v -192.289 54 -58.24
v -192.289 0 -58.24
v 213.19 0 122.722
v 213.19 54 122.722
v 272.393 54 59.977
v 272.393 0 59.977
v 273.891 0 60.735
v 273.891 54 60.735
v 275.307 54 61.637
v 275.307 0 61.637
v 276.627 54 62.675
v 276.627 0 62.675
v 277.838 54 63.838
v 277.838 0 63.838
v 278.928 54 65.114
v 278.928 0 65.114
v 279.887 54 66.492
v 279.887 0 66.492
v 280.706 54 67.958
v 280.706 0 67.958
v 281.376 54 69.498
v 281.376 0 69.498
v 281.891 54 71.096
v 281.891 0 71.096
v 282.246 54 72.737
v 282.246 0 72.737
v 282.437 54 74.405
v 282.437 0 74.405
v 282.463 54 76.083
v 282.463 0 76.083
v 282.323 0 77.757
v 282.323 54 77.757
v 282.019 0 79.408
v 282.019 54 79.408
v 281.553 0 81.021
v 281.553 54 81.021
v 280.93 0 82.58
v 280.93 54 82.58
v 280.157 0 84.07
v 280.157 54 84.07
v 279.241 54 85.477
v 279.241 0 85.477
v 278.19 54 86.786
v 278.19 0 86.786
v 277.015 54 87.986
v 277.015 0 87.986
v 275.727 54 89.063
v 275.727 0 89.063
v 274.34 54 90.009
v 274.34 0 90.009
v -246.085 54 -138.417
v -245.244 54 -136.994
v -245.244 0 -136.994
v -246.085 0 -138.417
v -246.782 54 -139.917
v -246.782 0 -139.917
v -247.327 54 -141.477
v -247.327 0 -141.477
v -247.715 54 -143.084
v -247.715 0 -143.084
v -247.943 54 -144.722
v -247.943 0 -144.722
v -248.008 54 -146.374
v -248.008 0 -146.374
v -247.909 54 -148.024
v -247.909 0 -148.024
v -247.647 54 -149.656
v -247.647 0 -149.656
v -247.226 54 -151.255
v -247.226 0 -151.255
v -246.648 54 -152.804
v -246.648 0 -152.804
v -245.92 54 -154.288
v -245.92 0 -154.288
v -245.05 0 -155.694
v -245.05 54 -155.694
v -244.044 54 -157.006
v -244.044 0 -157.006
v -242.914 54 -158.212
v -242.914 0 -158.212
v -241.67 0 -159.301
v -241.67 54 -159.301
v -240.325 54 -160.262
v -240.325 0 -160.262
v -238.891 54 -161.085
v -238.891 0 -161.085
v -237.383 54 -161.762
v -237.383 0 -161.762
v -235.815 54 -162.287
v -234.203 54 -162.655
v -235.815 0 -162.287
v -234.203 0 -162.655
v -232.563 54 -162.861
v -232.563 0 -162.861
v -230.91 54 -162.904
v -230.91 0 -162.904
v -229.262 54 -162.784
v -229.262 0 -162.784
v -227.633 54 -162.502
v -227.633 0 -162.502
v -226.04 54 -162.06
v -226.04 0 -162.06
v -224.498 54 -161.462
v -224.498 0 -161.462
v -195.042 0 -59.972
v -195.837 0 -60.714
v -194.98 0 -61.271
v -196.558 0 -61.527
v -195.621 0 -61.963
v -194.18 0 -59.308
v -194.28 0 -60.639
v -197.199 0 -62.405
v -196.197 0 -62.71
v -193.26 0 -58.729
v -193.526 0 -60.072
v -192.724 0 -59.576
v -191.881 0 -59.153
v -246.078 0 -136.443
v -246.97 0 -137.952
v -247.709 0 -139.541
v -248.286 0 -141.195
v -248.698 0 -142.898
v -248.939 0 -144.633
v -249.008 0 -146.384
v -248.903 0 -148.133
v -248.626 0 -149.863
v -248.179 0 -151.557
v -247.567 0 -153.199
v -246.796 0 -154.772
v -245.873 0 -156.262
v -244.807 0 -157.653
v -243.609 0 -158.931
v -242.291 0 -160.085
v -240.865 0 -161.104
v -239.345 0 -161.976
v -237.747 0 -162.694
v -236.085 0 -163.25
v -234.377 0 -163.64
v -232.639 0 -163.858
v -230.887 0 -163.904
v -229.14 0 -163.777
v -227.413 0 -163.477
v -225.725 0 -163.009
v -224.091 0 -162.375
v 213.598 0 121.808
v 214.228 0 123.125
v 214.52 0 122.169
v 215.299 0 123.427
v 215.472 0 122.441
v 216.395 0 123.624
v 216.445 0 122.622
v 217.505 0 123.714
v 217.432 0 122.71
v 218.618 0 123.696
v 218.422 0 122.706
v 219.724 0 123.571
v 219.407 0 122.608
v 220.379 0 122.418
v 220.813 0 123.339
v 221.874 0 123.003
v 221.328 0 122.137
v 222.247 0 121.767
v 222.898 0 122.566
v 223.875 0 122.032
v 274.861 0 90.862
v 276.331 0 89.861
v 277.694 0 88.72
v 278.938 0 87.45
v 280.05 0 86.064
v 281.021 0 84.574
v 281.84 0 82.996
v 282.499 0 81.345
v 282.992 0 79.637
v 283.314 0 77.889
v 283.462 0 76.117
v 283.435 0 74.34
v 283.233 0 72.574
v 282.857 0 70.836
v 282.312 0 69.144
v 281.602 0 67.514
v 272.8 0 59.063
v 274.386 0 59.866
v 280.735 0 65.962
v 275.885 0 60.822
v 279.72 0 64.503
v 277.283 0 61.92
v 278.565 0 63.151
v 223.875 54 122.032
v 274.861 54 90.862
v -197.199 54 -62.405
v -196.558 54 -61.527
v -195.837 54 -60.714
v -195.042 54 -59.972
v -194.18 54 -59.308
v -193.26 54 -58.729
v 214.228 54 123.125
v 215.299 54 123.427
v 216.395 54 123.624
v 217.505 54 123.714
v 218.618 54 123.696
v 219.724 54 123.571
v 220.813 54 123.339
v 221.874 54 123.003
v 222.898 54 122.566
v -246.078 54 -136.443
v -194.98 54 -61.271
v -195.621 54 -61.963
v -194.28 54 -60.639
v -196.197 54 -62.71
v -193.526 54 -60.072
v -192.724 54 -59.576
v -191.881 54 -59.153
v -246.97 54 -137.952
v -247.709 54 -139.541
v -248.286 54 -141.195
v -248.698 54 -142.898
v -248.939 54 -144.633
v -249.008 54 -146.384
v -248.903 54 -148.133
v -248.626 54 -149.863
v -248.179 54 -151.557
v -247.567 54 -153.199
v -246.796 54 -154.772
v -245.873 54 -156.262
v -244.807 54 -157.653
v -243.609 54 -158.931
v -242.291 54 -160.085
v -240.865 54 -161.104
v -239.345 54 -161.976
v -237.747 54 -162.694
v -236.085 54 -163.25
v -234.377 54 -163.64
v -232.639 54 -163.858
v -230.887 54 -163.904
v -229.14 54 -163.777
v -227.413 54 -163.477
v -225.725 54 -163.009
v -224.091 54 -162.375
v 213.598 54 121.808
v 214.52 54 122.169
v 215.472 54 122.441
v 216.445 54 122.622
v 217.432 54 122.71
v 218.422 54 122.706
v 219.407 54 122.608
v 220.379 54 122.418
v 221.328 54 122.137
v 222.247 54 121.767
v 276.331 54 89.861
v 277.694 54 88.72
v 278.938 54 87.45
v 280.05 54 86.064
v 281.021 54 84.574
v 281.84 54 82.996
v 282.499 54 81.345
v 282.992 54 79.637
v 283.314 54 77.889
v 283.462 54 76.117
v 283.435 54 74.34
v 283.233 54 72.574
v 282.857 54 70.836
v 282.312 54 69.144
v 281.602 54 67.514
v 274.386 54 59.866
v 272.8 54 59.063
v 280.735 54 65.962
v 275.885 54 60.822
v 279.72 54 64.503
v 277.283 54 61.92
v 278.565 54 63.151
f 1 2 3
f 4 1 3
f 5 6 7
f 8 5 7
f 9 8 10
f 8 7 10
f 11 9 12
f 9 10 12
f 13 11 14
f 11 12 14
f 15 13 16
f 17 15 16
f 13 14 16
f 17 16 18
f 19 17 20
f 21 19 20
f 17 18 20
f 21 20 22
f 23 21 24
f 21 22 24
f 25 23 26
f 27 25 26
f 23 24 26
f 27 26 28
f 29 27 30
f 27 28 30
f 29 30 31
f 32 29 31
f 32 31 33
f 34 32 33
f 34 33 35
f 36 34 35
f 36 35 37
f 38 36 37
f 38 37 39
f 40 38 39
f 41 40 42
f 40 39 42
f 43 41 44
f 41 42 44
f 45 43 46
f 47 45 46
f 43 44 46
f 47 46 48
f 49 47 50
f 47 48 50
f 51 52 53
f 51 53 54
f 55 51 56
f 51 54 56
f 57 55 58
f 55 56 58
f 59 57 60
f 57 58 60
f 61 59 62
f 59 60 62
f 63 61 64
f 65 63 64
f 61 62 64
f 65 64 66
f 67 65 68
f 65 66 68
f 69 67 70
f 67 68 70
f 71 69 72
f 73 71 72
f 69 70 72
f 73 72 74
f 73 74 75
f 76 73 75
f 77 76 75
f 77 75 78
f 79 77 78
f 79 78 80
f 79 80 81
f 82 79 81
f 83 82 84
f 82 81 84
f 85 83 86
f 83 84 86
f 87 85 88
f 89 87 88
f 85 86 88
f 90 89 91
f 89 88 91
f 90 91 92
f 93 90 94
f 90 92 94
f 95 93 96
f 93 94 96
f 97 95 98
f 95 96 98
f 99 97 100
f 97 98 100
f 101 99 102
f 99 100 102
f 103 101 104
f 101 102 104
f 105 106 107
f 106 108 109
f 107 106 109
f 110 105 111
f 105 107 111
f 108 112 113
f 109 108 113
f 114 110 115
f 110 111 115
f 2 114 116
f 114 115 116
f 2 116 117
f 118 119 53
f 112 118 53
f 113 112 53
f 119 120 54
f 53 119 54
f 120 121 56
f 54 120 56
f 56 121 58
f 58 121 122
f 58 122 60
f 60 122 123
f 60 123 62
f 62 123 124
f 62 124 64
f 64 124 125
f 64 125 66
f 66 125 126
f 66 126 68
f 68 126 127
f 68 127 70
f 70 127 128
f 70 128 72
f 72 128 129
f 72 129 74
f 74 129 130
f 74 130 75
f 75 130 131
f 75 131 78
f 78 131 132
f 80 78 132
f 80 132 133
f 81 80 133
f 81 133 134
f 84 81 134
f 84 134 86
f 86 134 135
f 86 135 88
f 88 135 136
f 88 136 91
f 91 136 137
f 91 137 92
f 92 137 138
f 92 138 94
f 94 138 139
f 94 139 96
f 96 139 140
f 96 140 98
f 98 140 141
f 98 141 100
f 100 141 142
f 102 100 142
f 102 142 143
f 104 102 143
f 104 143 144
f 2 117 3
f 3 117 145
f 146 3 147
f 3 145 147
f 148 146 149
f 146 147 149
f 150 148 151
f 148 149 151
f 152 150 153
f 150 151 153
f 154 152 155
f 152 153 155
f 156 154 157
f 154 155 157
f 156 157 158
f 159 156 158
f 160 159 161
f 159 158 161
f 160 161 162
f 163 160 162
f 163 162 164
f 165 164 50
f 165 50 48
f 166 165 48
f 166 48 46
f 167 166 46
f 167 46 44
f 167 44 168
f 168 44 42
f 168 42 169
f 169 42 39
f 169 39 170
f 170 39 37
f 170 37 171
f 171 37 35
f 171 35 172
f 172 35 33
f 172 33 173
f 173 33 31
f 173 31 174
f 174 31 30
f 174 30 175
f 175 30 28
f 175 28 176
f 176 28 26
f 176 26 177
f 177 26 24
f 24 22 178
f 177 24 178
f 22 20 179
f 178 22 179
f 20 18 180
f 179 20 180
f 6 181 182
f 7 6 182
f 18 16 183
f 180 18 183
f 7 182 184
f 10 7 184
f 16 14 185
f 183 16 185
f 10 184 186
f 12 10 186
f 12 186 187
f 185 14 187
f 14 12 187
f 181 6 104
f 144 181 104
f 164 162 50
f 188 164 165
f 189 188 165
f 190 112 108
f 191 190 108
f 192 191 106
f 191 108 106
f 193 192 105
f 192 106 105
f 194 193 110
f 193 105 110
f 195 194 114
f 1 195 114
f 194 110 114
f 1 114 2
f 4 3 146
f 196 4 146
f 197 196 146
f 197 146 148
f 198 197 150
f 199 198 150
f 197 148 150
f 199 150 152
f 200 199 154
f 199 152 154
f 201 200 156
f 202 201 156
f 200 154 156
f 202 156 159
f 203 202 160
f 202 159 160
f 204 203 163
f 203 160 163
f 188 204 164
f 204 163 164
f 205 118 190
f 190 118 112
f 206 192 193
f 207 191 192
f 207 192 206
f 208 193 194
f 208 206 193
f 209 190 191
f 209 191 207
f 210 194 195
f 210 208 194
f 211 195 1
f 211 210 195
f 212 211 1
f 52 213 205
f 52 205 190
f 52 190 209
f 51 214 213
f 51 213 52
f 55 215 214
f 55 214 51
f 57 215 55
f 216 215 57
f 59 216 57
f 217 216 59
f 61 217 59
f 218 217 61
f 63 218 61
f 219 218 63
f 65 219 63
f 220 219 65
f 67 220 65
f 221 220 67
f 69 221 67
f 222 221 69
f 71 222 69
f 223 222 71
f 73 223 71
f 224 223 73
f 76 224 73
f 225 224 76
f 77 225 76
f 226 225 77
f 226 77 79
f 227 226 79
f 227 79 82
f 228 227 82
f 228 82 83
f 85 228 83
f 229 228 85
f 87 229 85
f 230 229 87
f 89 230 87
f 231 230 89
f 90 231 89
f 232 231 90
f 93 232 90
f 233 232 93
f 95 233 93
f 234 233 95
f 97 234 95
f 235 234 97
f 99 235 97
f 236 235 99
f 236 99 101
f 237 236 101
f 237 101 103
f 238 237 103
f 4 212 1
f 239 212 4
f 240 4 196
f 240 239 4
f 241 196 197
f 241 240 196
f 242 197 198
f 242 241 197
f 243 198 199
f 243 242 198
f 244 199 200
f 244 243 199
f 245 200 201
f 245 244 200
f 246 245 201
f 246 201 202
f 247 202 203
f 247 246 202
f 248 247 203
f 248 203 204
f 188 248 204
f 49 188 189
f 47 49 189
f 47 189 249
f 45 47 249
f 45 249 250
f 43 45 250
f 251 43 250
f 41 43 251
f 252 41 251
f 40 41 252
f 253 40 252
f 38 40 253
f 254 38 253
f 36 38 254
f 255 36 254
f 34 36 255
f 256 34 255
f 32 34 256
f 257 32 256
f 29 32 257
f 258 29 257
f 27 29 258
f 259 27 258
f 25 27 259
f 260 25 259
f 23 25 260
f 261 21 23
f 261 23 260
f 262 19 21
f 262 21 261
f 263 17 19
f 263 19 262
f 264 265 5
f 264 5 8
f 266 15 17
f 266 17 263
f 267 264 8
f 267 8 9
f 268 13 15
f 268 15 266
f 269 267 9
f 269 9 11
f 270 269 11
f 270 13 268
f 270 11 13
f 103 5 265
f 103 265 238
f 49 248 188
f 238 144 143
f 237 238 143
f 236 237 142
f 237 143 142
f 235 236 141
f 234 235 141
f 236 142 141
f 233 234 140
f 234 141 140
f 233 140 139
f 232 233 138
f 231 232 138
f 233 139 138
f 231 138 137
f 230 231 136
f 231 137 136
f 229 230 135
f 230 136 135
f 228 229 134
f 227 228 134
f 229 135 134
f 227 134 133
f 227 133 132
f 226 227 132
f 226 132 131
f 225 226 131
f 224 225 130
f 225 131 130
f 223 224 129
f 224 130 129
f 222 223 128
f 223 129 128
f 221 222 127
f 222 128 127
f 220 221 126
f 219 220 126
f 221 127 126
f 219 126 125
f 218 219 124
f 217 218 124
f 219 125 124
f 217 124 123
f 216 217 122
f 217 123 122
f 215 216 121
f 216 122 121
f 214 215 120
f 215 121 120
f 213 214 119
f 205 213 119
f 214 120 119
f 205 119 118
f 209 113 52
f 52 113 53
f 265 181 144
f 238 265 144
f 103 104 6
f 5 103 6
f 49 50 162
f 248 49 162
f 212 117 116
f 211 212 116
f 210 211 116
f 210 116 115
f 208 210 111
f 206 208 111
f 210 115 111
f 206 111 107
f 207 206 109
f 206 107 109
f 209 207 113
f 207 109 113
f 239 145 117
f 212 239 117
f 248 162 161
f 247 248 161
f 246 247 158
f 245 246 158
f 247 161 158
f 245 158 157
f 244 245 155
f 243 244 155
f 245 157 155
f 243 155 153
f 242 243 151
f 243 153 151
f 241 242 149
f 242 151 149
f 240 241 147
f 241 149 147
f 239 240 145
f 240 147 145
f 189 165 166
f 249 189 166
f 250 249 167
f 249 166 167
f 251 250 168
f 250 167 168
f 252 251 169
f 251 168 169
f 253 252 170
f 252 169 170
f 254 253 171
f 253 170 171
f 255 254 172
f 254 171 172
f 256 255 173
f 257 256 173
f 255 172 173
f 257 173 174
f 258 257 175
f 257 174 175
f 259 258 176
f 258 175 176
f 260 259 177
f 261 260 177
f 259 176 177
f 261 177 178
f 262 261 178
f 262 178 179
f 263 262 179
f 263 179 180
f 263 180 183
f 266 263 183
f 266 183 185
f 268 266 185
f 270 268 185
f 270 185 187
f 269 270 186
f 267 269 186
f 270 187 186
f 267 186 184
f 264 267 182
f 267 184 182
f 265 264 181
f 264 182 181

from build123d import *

# Parameters (mm, degrees)
EXTRUDE_1_DEPTH = 54


with BuildPart() as part:
    # 草图1 → 凸台-拉伸1 (new body)
    with BuildSketch(Plane(origin=(0, 0, 0), x_dir=(1, 0, 0), z_dir=(0, 1, 0))):
        with BuildLine():
            ThreePointArc((-224.091230242, 162.375487068), (-244.806924848, 157.652626052), (-246.078397413, 136.443458772))
            Line((-246.078397413, 136.443458772), (-197.199257089, 62.405433085))
            ThreePointArc((-197.199257089, 62.405433085), (-195.041572593, 59.971891729), (-192.288857087, 58.239759155))
            Line((-192.288857087, 58.239759155), (213.190233659, -122.721502411))
            ThreePointArc((213.190233659, -122.721502411), (218.617938967, -123.695981456), (223.875273721, -122.031642066))
            Line((223.875273721, -122.031642066), (274.861498447, -90.862018276))
            ThreePointArc((274.861498447, -90.862018276), (283.435193918, -74.339940028), (272.79992067, -59.063216341))
            Line((272.79992067, -59.063216341), (-224.091230242, 162.375487068))
        make_face()
        with BuildLine():
            ThreePointArc((-245.243860787, 136.994411239), (-244.044186993, 157.005918262), (-224.498286741, 161.462084086))
            Line((-224.498286741, 161.462084086), (272.392864172, -59.976619323))
            ThreePointArc((272.392864172, -59.976619323), (282.437288906, -74.404636139), (274.33990985, -90.008821151))
            Line((274.33990985, -90.008821151), (222.246746967, -121.767406417))
            ThreePointArc((222.246746967, -121.767406417), (217.926670991, -122.719757656), (213.59777898, -121.808317429))
            Line((213.59777898, -121.808317429), (-191.881311765, 59.152944137))
            ThreePointArc((-191.881311765, 59.152944137), (-194.280273175, 60.63880571), (-196.19690286, 62.709875751))
            Line((-196.19690286, 62.709875751), (-245.243860787, 136.994411239))
        make_face(mode=Mode.SUBTRACT)
    extrude(amount=EXTRUDE_1_DEPTH)


solid = part.part
